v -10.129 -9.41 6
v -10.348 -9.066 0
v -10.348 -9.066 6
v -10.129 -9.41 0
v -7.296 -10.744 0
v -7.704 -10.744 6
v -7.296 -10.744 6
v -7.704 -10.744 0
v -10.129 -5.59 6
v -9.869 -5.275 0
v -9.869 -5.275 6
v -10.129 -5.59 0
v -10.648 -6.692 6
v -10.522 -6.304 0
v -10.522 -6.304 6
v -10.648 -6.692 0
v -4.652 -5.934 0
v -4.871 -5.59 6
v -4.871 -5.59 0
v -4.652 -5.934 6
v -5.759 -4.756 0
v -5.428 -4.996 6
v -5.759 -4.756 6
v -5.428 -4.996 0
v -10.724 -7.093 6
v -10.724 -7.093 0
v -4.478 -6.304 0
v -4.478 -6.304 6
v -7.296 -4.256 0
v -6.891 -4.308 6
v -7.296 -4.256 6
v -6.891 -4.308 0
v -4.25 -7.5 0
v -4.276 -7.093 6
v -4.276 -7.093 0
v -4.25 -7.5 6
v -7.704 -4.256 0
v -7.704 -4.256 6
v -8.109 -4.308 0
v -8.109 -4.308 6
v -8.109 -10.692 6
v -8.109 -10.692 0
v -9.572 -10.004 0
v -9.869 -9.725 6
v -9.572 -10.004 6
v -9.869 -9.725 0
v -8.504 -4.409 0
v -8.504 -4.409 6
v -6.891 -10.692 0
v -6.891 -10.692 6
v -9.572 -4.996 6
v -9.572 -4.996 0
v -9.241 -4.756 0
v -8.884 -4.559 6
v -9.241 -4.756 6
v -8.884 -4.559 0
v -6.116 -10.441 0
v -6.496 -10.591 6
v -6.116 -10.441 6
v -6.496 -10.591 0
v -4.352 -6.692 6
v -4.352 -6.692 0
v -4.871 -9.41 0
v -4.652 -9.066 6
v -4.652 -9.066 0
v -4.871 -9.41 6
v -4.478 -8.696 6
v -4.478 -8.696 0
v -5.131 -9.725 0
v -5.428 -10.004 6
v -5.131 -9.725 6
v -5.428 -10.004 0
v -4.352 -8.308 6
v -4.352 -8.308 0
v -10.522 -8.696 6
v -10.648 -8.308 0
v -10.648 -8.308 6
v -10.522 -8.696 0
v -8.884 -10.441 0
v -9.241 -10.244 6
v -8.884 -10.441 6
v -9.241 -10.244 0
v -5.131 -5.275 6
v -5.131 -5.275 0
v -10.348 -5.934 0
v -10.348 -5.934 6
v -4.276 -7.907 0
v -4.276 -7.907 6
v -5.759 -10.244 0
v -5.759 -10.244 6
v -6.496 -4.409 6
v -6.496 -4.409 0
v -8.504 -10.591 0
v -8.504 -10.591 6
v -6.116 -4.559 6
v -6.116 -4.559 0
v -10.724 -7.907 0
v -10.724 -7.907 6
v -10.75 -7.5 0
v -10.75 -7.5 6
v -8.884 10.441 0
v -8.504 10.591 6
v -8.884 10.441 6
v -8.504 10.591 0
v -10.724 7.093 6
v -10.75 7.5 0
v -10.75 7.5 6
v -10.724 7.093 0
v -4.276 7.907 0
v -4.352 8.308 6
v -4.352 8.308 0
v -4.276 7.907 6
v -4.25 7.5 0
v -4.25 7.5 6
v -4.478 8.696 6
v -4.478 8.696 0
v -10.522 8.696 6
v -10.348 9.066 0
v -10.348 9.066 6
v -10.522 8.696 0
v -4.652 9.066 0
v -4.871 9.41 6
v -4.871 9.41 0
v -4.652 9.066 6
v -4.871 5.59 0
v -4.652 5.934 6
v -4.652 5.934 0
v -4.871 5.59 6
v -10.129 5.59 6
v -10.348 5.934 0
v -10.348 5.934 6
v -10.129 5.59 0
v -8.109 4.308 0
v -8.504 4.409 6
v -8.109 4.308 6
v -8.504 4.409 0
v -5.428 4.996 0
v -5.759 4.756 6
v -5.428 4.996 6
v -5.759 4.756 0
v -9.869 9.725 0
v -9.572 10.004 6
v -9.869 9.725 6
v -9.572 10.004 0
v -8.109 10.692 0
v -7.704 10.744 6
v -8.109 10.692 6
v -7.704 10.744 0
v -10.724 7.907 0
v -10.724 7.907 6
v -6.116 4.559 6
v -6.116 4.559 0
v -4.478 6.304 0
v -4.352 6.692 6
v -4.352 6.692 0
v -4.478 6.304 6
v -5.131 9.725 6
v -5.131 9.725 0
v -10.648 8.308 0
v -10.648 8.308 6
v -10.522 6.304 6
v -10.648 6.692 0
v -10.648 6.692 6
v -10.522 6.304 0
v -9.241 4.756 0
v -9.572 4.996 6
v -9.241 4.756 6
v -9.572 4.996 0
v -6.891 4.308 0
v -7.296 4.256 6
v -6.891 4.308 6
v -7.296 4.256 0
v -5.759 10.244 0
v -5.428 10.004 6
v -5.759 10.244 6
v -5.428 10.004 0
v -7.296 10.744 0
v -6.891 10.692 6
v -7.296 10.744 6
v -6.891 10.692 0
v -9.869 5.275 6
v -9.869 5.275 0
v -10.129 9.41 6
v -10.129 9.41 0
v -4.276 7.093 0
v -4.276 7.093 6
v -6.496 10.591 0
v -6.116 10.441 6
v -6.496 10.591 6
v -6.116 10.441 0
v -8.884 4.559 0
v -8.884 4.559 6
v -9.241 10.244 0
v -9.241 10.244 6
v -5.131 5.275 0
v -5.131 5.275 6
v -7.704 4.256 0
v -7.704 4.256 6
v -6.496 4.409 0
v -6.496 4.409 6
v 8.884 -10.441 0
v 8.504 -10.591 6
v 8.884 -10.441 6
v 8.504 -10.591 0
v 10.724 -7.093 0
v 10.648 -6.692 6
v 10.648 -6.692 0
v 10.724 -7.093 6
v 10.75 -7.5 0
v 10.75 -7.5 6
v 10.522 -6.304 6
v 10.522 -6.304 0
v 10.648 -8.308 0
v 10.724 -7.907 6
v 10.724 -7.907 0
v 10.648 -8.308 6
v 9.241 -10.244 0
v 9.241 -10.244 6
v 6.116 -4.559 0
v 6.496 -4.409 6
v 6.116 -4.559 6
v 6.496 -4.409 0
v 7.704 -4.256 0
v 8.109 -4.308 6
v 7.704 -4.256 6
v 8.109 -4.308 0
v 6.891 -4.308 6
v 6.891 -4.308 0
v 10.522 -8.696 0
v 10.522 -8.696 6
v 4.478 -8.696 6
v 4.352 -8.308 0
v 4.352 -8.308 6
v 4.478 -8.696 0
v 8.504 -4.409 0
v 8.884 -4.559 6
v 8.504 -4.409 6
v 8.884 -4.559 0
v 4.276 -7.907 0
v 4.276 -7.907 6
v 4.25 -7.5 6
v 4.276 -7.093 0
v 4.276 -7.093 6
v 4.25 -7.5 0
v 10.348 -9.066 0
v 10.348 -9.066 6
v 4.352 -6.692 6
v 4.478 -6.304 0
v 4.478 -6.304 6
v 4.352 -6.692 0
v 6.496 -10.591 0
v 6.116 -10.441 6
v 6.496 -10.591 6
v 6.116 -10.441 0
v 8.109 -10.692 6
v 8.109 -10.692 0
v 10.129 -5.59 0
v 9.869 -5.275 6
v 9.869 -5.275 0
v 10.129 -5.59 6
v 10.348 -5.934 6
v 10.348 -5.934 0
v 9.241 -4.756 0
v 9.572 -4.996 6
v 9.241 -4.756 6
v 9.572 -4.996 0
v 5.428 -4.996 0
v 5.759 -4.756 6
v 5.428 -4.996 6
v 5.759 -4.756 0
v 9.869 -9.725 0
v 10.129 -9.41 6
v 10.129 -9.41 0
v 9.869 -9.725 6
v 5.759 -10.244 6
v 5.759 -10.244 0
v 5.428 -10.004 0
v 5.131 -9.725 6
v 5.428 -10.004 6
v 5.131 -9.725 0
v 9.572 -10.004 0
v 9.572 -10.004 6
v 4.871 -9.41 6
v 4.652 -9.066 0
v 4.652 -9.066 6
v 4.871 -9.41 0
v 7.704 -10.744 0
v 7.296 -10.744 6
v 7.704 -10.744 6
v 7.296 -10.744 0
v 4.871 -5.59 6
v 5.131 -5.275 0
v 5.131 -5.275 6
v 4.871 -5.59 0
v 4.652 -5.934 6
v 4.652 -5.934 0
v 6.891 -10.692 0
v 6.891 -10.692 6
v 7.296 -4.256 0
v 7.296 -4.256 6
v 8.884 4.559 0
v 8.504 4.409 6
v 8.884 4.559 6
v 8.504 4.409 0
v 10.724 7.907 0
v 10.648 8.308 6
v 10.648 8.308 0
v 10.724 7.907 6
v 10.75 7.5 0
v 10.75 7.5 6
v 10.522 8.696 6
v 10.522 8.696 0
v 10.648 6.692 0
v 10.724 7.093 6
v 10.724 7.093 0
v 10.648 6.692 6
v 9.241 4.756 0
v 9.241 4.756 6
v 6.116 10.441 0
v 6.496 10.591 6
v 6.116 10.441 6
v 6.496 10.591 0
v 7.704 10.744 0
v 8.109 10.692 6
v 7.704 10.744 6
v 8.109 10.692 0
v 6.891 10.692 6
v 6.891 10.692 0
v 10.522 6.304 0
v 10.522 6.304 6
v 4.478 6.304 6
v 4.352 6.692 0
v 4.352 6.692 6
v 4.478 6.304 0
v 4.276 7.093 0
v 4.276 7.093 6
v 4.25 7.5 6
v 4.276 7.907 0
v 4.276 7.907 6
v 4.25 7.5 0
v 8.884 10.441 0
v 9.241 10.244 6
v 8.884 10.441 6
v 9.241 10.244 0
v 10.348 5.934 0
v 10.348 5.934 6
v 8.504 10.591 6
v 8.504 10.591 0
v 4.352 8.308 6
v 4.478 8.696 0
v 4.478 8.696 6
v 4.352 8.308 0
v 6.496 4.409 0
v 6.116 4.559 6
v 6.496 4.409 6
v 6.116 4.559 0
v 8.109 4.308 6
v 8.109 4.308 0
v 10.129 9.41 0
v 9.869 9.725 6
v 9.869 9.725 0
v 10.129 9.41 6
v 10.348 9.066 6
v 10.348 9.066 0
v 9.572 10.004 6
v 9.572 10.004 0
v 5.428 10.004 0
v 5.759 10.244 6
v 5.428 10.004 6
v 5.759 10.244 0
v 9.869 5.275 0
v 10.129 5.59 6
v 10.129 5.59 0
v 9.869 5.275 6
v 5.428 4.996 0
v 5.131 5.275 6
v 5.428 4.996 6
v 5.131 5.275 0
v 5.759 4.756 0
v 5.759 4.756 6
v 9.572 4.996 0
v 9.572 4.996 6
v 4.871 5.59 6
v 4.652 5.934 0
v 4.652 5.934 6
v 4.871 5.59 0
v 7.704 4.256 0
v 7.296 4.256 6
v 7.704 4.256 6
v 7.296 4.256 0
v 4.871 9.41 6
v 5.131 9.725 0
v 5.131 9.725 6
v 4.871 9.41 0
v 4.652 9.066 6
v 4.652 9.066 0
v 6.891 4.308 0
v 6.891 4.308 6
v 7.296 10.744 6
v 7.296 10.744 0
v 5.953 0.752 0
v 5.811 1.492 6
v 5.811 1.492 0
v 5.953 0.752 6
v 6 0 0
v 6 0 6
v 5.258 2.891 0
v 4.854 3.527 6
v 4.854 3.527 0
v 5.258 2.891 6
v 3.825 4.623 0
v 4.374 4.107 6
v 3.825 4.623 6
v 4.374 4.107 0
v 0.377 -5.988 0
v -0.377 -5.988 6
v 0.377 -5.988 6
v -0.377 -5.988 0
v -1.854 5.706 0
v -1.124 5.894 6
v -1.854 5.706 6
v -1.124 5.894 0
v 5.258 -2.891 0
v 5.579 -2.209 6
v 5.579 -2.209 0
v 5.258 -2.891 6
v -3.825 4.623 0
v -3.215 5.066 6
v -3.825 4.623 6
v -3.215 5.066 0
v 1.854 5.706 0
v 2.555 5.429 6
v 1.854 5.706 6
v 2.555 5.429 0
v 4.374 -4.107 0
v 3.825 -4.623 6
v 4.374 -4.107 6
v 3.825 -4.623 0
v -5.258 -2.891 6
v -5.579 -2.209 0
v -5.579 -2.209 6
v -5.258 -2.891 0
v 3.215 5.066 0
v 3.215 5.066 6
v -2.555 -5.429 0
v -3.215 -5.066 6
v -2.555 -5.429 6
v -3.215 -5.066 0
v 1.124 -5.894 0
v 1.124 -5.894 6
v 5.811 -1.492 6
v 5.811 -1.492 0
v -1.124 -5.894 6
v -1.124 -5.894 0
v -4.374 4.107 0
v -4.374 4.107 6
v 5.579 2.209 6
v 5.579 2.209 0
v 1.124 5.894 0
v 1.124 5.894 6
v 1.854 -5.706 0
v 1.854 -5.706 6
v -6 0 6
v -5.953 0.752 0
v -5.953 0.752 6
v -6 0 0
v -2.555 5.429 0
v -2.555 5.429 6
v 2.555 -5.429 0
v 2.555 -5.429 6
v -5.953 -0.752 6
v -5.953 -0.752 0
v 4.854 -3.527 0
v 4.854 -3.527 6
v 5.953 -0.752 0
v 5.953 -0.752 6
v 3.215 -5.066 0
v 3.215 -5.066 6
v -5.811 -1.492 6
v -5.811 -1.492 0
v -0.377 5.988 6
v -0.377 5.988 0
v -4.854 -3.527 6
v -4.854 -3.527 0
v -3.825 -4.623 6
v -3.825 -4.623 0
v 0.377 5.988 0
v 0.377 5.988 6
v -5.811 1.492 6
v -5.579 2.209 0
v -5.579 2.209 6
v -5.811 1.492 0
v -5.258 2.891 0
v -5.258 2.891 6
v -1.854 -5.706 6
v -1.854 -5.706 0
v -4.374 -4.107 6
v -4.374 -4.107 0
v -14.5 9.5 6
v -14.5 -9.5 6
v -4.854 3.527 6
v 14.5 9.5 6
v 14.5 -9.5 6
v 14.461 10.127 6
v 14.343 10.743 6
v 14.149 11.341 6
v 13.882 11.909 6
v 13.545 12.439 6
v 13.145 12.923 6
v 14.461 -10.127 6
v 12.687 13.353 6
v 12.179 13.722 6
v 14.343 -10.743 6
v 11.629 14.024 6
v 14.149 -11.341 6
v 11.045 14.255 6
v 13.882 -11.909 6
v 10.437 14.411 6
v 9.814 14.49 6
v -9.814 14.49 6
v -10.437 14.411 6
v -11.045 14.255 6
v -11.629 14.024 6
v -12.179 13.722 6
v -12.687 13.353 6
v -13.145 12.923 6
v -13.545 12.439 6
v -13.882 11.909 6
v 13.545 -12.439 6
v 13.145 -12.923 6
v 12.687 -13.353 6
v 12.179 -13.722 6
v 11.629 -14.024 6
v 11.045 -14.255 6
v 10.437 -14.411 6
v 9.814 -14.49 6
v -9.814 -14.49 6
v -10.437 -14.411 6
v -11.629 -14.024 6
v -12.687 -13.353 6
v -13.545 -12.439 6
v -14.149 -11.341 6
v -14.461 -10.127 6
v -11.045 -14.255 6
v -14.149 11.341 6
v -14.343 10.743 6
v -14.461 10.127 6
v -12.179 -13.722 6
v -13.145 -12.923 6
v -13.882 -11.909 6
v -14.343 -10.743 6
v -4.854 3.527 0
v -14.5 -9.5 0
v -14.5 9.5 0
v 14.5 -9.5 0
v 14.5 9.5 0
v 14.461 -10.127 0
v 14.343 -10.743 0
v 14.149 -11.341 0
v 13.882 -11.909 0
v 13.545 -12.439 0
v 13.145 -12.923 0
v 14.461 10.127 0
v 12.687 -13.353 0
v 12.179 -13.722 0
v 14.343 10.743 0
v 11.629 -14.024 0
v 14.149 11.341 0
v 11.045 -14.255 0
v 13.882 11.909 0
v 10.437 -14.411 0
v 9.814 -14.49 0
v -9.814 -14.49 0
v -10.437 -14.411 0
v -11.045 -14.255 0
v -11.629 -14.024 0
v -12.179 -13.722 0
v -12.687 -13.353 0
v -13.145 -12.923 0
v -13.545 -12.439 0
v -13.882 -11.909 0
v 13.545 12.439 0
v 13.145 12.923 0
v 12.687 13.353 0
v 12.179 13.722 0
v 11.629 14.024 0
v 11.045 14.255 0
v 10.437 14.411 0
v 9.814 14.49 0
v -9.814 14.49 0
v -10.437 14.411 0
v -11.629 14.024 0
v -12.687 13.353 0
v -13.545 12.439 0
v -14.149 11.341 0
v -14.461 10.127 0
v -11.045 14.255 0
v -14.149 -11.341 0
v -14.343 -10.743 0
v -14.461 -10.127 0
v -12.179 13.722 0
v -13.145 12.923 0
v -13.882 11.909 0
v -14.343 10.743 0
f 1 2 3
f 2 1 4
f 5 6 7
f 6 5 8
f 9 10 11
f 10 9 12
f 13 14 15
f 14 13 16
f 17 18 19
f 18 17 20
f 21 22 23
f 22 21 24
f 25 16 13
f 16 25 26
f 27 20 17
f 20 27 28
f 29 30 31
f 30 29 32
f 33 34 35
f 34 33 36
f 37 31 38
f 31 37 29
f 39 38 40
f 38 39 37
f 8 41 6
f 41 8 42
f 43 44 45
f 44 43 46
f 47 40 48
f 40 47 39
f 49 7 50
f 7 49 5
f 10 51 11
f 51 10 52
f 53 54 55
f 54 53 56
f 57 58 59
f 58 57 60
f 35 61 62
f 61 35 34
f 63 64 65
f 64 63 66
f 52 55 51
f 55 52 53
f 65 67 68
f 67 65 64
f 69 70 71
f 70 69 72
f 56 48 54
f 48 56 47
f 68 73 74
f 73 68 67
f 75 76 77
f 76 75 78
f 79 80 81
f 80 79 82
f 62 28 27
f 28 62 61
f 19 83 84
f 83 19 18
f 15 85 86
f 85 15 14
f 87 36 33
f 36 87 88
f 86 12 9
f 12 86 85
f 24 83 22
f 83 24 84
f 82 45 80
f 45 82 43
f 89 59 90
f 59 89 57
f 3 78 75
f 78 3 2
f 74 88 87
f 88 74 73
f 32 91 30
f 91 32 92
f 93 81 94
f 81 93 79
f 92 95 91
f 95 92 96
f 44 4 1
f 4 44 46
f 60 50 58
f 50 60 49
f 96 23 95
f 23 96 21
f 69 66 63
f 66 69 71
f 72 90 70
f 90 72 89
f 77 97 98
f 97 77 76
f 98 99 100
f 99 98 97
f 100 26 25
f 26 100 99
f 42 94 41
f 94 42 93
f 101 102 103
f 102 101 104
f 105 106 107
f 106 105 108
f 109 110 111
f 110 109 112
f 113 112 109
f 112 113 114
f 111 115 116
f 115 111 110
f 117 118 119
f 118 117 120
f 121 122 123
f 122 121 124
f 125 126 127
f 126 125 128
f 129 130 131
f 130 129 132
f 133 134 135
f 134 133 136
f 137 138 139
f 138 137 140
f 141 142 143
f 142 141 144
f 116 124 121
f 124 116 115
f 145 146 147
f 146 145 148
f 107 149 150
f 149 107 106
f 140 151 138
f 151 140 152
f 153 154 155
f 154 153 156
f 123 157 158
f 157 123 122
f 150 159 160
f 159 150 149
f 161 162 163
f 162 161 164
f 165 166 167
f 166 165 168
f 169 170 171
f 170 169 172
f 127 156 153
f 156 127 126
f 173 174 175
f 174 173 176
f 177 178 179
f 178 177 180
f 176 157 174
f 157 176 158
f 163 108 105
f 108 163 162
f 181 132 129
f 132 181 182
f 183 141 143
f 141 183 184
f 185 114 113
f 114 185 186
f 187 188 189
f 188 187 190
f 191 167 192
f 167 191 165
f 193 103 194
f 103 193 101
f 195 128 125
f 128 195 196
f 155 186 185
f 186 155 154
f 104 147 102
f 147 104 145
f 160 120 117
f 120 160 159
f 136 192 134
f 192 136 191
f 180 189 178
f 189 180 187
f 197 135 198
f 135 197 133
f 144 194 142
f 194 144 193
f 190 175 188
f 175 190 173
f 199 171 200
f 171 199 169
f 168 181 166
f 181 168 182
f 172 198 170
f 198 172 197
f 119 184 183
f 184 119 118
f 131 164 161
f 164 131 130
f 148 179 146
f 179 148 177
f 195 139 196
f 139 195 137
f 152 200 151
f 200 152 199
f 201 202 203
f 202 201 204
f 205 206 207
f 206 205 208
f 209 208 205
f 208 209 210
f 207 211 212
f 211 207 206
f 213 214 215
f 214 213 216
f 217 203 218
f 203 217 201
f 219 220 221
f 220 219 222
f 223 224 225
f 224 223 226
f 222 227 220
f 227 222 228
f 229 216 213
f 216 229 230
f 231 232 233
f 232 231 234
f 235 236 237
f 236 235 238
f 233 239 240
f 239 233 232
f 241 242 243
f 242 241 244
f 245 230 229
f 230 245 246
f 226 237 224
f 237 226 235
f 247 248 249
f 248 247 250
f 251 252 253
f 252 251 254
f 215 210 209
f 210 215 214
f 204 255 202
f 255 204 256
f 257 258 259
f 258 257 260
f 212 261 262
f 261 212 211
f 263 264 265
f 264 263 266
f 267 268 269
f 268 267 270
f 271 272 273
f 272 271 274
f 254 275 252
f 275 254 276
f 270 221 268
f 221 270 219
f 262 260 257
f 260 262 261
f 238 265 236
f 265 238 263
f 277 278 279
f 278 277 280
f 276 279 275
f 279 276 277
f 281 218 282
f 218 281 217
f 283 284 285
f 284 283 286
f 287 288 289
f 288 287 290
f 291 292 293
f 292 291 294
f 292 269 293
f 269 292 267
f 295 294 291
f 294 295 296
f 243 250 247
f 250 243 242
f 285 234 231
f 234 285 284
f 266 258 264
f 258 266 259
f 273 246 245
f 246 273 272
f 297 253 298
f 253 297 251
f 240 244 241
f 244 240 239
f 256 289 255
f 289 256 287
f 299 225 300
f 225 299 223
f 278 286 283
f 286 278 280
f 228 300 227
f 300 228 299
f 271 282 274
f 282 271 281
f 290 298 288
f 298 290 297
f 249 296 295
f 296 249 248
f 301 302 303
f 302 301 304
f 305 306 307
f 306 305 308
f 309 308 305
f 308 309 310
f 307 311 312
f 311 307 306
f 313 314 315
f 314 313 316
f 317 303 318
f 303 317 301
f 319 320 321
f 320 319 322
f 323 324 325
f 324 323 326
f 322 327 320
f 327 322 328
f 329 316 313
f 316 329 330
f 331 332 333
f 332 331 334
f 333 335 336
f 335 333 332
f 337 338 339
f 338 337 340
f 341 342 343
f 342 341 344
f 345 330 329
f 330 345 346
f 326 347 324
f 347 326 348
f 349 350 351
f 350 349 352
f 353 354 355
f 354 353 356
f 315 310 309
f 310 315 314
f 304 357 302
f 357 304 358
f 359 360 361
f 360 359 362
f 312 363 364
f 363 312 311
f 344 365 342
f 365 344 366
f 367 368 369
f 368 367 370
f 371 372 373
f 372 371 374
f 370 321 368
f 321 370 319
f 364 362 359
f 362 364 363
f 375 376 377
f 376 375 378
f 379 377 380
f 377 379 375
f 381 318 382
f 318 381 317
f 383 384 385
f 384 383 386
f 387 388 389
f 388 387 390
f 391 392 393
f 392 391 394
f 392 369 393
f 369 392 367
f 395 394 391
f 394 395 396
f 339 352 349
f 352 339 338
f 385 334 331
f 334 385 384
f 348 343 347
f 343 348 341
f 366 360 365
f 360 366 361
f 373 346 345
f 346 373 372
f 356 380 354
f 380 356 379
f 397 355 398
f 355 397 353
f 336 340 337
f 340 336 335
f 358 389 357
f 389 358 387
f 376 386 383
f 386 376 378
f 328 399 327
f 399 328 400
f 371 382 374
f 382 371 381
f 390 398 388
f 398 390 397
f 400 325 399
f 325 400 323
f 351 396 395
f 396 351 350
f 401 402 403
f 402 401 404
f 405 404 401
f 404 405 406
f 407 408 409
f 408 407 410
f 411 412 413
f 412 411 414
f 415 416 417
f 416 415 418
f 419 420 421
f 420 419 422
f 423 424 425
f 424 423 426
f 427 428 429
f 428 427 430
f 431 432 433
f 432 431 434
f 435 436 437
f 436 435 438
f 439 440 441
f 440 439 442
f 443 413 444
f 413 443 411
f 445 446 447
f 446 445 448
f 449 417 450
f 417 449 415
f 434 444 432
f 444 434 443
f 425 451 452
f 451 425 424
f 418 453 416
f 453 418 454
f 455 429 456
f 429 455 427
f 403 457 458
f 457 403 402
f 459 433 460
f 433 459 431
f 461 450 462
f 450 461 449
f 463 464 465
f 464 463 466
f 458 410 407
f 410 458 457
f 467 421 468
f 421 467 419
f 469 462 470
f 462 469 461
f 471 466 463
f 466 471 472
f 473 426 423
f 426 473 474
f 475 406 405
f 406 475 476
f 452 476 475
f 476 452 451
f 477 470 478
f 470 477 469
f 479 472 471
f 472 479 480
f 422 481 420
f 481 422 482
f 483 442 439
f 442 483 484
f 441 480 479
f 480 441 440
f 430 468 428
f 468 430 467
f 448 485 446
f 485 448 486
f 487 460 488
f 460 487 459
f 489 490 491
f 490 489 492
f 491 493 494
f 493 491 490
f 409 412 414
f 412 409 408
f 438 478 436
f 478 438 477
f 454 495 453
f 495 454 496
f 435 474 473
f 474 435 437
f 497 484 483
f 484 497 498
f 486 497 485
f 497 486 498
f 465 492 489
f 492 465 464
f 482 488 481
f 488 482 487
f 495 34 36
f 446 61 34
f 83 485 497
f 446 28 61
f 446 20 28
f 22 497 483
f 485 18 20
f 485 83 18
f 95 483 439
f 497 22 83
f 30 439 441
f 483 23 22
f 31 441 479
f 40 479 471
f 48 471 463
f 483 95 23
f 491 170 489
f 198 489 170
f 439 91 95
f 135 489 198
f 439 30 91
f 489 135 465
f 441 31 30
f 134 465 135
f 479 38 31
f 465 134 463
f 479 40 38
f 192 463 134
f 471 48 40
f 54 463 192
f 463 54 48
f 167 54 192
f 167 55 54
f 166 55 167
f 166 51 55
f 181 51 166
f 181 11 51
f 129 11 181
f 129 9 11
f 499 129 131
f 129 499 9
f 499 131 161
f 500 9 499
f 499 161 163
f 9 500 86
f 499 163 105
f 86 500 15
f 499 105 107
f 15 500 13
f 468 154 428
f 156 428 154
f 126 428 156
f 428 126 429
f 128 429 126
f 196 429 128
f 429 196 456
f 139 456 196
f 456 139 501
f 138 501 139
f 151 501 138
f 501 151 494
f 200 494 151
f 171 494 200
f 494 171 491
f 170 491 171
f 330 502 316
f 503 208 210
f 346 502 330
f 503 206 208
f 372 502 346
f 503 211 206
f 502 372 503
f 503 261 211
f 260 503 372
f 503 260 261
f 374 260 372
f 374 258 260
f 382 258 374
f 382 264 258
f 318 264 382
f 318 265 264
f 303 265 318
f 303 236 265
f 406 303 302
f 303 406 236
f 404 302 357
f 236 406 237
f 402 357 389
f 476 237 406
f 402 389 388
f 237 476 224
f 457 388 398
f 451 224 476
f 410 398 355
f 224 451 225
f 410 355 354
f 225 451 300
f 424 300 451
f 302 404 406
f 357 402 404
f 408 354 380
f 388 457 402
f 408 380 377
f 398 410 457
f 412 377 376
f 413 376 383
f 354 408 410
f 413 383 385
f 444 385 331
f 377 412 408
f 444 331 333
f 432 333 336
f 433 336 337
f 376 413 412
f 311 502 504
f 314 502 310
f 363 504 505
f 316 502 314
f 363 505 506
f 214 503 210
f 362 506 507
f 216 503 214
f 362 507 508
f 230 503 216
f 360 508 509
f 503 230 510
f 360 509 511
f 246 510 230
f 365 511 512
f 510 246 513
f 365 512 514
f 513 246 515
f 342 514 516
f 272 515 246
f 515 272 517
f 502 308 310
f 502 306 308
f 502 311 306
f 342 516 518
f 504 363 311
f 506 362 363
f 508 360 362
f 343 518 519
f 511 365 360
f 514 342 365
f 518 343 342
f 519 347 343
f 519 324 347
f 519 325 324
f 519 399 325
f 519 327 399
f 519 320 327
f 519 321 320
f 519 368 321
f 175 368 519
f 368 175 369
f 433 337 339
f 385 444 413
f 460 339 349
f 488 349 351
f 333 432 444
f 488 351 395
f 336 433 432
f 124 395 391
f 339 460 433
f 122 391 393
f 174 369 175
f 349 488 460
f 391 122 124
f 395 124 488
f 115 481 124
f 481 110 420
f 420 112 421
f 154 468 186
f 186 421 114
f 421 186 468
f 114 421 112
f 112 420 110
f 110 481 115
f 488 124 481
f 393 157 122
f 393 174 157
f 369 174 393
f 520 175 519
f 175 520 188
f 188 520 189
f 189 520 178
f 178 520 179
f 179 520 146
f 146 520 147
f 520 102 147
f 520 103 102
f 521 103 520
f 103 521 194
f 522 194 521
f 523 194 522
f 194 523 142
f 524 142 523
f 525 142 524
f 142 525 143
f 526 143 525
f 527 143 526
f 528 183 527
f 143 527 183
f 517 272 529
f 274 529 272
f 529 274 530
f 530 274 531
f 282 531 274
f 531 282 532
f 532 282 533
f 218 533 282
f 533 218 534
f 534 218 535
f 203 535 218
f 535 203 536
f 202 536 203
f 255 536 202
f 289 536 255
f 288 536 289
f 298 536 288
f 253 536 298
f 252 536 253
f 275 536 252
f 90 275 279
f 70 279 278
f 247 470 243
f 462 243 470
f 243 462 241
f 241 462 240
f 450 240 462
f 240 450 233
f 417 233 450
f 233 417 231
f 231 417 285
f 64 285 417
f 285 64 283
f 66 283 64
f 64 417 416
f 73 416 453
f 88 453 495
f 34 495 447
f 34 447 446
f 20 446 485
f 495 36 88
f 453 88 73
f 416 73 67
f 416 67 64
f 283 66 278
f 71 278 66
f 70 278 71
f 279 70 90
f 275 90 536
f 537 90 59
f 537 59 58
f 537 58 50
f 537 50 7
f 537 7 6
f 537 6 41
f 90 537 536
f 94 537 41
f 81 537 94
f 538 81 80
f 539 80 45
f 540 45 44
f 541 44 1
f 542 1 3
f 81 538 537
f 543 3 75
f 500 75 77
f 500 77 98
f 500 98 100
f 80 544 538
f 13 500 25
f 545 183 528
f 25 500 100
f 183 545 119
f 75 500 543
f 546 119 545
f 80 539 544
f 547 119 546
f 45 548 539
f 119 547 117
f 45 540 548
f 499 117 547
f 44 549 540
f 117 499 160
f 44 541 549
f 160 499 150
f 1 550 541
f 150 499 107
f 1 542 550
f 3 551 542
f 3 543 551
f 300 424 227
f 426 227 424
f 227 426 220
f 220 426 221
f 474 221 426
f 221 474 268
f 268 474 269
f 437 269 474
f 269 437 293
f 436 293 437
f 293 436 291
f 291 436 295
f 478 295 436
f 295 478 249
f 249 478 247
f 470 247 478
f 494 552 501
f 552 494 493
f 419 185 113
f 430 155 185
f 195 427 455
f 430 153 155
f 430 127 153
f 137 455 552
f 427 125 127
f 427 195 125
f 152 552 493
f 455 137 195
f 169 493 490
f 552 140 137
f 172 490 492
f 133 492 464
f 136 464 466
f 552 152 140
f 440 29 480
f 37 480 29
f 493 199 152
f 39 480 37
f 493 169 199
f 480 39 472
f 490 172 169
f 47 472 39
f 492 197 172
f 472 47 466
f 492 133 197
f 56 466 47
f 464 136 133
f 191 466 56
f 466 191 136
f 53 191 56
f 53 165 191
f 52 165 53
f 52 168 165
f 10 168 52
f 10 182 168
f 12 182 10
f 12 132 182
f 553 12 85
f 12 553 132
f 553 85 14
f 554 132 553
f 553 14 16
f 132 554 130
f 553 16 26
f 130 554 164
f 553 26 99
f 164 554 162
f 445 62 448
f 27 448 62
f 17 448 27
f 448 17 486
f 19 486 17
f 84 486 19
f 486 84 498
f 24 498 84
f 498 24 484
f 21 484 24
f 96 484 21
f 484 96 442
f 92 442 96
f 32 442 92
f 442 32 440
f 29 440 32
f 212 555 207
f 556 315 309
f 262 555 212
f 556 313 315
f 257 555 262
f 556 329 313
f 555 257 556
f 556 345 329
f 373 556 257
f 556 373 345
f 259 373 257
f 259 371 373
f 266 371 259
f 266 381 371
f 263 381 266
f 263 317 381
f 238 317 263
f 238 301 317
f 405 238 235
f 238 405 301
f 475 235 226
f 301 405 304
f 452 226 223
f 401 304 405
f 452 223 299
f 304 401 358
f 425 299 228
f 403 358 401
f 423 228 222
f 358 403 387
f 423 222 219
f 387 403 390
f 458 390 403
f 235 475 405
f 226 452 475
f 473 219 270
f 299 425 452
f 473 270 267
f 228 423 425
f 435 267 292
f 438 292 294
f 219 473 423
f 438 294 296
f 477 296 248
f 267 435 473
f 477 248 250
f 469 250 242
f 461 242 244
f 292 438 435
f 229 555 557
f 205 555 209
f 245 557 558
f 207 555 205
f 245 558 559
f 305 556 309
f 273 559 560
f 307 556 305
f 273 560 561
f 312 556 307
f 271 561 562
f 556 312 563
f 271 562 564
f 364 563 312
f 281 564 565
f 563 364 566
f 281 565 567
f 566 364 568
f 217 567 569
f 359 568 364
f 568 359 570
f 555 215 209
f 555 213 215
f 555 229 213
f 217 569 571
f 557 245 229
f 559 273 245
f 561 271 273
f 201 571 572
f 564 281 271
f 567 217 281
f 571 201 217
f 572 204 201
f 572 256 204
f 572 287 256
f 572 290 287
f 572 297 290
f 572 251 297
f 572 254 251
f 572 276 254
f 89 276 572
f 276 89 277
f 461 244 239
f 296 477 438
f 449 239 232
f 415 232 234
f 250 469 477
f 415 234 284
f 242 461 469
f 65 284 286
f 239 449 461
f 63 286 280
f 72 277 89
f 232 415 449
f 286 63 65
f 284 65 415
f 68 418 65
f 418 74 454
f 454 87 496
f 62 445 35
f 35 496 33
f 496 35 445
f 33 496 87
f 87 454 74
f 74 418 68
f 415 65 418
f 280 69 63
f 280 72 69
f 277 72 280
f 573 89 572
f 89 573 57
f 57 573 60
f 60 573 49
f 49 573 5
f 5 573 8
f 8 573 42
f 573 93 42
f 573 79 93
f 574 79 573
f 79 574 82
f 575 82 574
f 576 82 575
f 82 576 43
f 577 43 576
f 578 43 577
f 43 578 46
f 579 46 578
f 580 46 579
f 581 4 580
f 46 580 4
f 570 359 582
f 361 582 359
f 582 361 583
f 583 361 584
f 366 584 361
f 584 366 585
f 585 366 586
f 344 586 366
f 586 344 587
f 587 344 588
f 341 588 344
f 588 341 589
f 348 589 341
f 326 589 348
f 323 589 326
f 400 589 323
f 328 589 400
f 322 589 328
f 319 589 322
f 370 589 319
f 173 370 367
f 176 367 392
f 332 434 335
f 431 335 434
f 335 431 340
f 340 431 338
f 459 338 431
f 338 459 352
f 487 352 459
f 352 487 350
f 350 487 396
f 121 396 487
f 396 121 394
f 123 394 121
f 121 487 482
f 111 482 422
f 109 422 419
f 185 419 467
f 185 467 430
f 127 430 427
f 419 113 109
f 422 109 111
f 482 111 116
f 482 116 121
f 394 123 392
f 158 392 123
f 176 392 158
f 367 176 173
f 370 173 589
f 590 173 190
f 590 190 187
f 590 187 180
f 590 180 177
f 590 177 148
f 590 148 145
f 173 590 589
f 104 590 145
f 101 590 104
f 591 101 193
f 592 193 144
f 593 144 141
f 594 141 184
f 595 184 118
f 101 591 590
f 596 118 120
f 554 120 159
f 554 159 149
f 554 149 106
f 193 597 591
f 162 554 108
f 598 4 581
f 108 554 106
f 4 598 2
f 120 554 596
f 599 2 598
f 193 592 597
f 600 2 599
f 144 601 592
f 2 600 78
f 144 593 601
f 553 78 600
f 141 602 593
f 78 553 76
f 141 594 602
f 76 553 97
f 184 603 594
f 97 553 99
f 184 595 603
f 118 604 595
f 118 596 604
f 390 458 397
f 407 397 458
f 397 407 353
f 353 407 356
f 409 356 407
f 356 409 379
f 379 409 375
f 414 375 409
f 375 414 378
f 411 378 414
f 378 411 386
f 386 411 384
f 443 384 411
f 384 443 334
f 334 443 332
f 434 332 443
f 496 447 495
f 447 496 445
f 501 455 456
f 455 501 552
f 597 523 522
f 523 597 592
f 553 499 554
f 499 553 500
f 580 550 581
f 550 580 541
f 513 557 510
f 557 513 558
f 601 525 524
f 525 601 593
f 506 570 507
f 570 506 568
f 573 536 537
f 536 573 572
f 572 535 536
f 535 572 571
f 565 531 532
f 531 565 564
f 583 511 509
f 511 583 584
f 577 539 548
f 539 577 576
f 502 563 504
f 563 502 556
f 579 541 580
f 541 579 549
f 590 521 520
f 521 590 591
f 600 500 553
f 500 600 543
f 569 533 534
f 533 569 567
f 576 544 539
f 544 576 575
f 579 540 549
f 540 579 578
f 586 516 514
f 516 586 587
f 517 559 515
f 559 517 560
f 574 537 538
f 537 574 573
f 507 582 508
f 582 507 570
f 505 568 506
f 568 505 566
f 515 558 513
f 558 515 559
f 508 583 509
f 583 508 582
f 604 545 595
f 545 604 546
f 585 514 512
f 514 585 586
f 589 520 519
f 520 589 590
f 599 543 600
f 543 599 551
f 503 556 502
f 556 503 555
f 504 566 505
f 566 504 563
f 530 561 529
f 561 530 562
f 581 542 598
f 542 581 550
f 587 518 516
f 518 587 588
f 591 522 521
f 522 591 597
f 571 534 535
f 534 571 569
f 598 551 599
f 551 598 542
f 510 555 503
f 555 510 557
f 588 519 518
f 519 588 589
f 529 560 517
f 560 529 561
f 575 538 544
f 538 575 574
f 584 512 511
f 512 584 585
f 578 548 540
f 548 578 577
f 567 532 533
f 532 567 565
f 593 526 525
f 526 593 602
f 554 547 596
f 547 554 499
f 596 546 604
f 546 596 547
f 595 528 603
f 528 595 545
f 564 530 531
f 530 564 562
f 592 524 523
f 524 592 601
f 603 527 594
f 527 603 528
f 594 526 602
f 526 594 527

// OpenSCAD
$fn = 50;


difference() {
	union() {
		hull() {
			translate(v = [-9.5000000000, 9.5000000000, 0]) {
				cylinder(h = 6, r = 5);
			}
			translate(v = [9.5000000000, 9.5000000000, 0]) {
				cylinder(h = 6, r = 5);
			}
			translate(v = [-9.5000000000, -9.5000000000, 0]) {
				cylinder(h = 6, r = 5);
			}
			translate(v = [9.5000000000, -9.5000000000, 0]) {
				cylinder(h = 6, r = 5);
			}
		}
	}
	union() {
		#translate(v = [-7.5000000000, -7.5000000000, -100.0000000000]) {
			cylinder(h = 200, r = 3.2500000000);
		}
		#translate(v = [-7.5000000000, 7.5000000000, -100.0000000000]) {
			cylinder(h = 200, r = 3.2500000000);
		}
		#translate(v = [7.5000000000, -7.5000000000, -100.0000000000]) {
			cylinder(h = 200, r = 3.2500000000);
		}
		#translate(v = [7.5000000000, 7.5000000000, -100.0000000000]) {
			cylinder(h = 200, r = 3.2500000000);
		}
		#cylinder(h = 6, r = 6.0000000000);
	}
}
